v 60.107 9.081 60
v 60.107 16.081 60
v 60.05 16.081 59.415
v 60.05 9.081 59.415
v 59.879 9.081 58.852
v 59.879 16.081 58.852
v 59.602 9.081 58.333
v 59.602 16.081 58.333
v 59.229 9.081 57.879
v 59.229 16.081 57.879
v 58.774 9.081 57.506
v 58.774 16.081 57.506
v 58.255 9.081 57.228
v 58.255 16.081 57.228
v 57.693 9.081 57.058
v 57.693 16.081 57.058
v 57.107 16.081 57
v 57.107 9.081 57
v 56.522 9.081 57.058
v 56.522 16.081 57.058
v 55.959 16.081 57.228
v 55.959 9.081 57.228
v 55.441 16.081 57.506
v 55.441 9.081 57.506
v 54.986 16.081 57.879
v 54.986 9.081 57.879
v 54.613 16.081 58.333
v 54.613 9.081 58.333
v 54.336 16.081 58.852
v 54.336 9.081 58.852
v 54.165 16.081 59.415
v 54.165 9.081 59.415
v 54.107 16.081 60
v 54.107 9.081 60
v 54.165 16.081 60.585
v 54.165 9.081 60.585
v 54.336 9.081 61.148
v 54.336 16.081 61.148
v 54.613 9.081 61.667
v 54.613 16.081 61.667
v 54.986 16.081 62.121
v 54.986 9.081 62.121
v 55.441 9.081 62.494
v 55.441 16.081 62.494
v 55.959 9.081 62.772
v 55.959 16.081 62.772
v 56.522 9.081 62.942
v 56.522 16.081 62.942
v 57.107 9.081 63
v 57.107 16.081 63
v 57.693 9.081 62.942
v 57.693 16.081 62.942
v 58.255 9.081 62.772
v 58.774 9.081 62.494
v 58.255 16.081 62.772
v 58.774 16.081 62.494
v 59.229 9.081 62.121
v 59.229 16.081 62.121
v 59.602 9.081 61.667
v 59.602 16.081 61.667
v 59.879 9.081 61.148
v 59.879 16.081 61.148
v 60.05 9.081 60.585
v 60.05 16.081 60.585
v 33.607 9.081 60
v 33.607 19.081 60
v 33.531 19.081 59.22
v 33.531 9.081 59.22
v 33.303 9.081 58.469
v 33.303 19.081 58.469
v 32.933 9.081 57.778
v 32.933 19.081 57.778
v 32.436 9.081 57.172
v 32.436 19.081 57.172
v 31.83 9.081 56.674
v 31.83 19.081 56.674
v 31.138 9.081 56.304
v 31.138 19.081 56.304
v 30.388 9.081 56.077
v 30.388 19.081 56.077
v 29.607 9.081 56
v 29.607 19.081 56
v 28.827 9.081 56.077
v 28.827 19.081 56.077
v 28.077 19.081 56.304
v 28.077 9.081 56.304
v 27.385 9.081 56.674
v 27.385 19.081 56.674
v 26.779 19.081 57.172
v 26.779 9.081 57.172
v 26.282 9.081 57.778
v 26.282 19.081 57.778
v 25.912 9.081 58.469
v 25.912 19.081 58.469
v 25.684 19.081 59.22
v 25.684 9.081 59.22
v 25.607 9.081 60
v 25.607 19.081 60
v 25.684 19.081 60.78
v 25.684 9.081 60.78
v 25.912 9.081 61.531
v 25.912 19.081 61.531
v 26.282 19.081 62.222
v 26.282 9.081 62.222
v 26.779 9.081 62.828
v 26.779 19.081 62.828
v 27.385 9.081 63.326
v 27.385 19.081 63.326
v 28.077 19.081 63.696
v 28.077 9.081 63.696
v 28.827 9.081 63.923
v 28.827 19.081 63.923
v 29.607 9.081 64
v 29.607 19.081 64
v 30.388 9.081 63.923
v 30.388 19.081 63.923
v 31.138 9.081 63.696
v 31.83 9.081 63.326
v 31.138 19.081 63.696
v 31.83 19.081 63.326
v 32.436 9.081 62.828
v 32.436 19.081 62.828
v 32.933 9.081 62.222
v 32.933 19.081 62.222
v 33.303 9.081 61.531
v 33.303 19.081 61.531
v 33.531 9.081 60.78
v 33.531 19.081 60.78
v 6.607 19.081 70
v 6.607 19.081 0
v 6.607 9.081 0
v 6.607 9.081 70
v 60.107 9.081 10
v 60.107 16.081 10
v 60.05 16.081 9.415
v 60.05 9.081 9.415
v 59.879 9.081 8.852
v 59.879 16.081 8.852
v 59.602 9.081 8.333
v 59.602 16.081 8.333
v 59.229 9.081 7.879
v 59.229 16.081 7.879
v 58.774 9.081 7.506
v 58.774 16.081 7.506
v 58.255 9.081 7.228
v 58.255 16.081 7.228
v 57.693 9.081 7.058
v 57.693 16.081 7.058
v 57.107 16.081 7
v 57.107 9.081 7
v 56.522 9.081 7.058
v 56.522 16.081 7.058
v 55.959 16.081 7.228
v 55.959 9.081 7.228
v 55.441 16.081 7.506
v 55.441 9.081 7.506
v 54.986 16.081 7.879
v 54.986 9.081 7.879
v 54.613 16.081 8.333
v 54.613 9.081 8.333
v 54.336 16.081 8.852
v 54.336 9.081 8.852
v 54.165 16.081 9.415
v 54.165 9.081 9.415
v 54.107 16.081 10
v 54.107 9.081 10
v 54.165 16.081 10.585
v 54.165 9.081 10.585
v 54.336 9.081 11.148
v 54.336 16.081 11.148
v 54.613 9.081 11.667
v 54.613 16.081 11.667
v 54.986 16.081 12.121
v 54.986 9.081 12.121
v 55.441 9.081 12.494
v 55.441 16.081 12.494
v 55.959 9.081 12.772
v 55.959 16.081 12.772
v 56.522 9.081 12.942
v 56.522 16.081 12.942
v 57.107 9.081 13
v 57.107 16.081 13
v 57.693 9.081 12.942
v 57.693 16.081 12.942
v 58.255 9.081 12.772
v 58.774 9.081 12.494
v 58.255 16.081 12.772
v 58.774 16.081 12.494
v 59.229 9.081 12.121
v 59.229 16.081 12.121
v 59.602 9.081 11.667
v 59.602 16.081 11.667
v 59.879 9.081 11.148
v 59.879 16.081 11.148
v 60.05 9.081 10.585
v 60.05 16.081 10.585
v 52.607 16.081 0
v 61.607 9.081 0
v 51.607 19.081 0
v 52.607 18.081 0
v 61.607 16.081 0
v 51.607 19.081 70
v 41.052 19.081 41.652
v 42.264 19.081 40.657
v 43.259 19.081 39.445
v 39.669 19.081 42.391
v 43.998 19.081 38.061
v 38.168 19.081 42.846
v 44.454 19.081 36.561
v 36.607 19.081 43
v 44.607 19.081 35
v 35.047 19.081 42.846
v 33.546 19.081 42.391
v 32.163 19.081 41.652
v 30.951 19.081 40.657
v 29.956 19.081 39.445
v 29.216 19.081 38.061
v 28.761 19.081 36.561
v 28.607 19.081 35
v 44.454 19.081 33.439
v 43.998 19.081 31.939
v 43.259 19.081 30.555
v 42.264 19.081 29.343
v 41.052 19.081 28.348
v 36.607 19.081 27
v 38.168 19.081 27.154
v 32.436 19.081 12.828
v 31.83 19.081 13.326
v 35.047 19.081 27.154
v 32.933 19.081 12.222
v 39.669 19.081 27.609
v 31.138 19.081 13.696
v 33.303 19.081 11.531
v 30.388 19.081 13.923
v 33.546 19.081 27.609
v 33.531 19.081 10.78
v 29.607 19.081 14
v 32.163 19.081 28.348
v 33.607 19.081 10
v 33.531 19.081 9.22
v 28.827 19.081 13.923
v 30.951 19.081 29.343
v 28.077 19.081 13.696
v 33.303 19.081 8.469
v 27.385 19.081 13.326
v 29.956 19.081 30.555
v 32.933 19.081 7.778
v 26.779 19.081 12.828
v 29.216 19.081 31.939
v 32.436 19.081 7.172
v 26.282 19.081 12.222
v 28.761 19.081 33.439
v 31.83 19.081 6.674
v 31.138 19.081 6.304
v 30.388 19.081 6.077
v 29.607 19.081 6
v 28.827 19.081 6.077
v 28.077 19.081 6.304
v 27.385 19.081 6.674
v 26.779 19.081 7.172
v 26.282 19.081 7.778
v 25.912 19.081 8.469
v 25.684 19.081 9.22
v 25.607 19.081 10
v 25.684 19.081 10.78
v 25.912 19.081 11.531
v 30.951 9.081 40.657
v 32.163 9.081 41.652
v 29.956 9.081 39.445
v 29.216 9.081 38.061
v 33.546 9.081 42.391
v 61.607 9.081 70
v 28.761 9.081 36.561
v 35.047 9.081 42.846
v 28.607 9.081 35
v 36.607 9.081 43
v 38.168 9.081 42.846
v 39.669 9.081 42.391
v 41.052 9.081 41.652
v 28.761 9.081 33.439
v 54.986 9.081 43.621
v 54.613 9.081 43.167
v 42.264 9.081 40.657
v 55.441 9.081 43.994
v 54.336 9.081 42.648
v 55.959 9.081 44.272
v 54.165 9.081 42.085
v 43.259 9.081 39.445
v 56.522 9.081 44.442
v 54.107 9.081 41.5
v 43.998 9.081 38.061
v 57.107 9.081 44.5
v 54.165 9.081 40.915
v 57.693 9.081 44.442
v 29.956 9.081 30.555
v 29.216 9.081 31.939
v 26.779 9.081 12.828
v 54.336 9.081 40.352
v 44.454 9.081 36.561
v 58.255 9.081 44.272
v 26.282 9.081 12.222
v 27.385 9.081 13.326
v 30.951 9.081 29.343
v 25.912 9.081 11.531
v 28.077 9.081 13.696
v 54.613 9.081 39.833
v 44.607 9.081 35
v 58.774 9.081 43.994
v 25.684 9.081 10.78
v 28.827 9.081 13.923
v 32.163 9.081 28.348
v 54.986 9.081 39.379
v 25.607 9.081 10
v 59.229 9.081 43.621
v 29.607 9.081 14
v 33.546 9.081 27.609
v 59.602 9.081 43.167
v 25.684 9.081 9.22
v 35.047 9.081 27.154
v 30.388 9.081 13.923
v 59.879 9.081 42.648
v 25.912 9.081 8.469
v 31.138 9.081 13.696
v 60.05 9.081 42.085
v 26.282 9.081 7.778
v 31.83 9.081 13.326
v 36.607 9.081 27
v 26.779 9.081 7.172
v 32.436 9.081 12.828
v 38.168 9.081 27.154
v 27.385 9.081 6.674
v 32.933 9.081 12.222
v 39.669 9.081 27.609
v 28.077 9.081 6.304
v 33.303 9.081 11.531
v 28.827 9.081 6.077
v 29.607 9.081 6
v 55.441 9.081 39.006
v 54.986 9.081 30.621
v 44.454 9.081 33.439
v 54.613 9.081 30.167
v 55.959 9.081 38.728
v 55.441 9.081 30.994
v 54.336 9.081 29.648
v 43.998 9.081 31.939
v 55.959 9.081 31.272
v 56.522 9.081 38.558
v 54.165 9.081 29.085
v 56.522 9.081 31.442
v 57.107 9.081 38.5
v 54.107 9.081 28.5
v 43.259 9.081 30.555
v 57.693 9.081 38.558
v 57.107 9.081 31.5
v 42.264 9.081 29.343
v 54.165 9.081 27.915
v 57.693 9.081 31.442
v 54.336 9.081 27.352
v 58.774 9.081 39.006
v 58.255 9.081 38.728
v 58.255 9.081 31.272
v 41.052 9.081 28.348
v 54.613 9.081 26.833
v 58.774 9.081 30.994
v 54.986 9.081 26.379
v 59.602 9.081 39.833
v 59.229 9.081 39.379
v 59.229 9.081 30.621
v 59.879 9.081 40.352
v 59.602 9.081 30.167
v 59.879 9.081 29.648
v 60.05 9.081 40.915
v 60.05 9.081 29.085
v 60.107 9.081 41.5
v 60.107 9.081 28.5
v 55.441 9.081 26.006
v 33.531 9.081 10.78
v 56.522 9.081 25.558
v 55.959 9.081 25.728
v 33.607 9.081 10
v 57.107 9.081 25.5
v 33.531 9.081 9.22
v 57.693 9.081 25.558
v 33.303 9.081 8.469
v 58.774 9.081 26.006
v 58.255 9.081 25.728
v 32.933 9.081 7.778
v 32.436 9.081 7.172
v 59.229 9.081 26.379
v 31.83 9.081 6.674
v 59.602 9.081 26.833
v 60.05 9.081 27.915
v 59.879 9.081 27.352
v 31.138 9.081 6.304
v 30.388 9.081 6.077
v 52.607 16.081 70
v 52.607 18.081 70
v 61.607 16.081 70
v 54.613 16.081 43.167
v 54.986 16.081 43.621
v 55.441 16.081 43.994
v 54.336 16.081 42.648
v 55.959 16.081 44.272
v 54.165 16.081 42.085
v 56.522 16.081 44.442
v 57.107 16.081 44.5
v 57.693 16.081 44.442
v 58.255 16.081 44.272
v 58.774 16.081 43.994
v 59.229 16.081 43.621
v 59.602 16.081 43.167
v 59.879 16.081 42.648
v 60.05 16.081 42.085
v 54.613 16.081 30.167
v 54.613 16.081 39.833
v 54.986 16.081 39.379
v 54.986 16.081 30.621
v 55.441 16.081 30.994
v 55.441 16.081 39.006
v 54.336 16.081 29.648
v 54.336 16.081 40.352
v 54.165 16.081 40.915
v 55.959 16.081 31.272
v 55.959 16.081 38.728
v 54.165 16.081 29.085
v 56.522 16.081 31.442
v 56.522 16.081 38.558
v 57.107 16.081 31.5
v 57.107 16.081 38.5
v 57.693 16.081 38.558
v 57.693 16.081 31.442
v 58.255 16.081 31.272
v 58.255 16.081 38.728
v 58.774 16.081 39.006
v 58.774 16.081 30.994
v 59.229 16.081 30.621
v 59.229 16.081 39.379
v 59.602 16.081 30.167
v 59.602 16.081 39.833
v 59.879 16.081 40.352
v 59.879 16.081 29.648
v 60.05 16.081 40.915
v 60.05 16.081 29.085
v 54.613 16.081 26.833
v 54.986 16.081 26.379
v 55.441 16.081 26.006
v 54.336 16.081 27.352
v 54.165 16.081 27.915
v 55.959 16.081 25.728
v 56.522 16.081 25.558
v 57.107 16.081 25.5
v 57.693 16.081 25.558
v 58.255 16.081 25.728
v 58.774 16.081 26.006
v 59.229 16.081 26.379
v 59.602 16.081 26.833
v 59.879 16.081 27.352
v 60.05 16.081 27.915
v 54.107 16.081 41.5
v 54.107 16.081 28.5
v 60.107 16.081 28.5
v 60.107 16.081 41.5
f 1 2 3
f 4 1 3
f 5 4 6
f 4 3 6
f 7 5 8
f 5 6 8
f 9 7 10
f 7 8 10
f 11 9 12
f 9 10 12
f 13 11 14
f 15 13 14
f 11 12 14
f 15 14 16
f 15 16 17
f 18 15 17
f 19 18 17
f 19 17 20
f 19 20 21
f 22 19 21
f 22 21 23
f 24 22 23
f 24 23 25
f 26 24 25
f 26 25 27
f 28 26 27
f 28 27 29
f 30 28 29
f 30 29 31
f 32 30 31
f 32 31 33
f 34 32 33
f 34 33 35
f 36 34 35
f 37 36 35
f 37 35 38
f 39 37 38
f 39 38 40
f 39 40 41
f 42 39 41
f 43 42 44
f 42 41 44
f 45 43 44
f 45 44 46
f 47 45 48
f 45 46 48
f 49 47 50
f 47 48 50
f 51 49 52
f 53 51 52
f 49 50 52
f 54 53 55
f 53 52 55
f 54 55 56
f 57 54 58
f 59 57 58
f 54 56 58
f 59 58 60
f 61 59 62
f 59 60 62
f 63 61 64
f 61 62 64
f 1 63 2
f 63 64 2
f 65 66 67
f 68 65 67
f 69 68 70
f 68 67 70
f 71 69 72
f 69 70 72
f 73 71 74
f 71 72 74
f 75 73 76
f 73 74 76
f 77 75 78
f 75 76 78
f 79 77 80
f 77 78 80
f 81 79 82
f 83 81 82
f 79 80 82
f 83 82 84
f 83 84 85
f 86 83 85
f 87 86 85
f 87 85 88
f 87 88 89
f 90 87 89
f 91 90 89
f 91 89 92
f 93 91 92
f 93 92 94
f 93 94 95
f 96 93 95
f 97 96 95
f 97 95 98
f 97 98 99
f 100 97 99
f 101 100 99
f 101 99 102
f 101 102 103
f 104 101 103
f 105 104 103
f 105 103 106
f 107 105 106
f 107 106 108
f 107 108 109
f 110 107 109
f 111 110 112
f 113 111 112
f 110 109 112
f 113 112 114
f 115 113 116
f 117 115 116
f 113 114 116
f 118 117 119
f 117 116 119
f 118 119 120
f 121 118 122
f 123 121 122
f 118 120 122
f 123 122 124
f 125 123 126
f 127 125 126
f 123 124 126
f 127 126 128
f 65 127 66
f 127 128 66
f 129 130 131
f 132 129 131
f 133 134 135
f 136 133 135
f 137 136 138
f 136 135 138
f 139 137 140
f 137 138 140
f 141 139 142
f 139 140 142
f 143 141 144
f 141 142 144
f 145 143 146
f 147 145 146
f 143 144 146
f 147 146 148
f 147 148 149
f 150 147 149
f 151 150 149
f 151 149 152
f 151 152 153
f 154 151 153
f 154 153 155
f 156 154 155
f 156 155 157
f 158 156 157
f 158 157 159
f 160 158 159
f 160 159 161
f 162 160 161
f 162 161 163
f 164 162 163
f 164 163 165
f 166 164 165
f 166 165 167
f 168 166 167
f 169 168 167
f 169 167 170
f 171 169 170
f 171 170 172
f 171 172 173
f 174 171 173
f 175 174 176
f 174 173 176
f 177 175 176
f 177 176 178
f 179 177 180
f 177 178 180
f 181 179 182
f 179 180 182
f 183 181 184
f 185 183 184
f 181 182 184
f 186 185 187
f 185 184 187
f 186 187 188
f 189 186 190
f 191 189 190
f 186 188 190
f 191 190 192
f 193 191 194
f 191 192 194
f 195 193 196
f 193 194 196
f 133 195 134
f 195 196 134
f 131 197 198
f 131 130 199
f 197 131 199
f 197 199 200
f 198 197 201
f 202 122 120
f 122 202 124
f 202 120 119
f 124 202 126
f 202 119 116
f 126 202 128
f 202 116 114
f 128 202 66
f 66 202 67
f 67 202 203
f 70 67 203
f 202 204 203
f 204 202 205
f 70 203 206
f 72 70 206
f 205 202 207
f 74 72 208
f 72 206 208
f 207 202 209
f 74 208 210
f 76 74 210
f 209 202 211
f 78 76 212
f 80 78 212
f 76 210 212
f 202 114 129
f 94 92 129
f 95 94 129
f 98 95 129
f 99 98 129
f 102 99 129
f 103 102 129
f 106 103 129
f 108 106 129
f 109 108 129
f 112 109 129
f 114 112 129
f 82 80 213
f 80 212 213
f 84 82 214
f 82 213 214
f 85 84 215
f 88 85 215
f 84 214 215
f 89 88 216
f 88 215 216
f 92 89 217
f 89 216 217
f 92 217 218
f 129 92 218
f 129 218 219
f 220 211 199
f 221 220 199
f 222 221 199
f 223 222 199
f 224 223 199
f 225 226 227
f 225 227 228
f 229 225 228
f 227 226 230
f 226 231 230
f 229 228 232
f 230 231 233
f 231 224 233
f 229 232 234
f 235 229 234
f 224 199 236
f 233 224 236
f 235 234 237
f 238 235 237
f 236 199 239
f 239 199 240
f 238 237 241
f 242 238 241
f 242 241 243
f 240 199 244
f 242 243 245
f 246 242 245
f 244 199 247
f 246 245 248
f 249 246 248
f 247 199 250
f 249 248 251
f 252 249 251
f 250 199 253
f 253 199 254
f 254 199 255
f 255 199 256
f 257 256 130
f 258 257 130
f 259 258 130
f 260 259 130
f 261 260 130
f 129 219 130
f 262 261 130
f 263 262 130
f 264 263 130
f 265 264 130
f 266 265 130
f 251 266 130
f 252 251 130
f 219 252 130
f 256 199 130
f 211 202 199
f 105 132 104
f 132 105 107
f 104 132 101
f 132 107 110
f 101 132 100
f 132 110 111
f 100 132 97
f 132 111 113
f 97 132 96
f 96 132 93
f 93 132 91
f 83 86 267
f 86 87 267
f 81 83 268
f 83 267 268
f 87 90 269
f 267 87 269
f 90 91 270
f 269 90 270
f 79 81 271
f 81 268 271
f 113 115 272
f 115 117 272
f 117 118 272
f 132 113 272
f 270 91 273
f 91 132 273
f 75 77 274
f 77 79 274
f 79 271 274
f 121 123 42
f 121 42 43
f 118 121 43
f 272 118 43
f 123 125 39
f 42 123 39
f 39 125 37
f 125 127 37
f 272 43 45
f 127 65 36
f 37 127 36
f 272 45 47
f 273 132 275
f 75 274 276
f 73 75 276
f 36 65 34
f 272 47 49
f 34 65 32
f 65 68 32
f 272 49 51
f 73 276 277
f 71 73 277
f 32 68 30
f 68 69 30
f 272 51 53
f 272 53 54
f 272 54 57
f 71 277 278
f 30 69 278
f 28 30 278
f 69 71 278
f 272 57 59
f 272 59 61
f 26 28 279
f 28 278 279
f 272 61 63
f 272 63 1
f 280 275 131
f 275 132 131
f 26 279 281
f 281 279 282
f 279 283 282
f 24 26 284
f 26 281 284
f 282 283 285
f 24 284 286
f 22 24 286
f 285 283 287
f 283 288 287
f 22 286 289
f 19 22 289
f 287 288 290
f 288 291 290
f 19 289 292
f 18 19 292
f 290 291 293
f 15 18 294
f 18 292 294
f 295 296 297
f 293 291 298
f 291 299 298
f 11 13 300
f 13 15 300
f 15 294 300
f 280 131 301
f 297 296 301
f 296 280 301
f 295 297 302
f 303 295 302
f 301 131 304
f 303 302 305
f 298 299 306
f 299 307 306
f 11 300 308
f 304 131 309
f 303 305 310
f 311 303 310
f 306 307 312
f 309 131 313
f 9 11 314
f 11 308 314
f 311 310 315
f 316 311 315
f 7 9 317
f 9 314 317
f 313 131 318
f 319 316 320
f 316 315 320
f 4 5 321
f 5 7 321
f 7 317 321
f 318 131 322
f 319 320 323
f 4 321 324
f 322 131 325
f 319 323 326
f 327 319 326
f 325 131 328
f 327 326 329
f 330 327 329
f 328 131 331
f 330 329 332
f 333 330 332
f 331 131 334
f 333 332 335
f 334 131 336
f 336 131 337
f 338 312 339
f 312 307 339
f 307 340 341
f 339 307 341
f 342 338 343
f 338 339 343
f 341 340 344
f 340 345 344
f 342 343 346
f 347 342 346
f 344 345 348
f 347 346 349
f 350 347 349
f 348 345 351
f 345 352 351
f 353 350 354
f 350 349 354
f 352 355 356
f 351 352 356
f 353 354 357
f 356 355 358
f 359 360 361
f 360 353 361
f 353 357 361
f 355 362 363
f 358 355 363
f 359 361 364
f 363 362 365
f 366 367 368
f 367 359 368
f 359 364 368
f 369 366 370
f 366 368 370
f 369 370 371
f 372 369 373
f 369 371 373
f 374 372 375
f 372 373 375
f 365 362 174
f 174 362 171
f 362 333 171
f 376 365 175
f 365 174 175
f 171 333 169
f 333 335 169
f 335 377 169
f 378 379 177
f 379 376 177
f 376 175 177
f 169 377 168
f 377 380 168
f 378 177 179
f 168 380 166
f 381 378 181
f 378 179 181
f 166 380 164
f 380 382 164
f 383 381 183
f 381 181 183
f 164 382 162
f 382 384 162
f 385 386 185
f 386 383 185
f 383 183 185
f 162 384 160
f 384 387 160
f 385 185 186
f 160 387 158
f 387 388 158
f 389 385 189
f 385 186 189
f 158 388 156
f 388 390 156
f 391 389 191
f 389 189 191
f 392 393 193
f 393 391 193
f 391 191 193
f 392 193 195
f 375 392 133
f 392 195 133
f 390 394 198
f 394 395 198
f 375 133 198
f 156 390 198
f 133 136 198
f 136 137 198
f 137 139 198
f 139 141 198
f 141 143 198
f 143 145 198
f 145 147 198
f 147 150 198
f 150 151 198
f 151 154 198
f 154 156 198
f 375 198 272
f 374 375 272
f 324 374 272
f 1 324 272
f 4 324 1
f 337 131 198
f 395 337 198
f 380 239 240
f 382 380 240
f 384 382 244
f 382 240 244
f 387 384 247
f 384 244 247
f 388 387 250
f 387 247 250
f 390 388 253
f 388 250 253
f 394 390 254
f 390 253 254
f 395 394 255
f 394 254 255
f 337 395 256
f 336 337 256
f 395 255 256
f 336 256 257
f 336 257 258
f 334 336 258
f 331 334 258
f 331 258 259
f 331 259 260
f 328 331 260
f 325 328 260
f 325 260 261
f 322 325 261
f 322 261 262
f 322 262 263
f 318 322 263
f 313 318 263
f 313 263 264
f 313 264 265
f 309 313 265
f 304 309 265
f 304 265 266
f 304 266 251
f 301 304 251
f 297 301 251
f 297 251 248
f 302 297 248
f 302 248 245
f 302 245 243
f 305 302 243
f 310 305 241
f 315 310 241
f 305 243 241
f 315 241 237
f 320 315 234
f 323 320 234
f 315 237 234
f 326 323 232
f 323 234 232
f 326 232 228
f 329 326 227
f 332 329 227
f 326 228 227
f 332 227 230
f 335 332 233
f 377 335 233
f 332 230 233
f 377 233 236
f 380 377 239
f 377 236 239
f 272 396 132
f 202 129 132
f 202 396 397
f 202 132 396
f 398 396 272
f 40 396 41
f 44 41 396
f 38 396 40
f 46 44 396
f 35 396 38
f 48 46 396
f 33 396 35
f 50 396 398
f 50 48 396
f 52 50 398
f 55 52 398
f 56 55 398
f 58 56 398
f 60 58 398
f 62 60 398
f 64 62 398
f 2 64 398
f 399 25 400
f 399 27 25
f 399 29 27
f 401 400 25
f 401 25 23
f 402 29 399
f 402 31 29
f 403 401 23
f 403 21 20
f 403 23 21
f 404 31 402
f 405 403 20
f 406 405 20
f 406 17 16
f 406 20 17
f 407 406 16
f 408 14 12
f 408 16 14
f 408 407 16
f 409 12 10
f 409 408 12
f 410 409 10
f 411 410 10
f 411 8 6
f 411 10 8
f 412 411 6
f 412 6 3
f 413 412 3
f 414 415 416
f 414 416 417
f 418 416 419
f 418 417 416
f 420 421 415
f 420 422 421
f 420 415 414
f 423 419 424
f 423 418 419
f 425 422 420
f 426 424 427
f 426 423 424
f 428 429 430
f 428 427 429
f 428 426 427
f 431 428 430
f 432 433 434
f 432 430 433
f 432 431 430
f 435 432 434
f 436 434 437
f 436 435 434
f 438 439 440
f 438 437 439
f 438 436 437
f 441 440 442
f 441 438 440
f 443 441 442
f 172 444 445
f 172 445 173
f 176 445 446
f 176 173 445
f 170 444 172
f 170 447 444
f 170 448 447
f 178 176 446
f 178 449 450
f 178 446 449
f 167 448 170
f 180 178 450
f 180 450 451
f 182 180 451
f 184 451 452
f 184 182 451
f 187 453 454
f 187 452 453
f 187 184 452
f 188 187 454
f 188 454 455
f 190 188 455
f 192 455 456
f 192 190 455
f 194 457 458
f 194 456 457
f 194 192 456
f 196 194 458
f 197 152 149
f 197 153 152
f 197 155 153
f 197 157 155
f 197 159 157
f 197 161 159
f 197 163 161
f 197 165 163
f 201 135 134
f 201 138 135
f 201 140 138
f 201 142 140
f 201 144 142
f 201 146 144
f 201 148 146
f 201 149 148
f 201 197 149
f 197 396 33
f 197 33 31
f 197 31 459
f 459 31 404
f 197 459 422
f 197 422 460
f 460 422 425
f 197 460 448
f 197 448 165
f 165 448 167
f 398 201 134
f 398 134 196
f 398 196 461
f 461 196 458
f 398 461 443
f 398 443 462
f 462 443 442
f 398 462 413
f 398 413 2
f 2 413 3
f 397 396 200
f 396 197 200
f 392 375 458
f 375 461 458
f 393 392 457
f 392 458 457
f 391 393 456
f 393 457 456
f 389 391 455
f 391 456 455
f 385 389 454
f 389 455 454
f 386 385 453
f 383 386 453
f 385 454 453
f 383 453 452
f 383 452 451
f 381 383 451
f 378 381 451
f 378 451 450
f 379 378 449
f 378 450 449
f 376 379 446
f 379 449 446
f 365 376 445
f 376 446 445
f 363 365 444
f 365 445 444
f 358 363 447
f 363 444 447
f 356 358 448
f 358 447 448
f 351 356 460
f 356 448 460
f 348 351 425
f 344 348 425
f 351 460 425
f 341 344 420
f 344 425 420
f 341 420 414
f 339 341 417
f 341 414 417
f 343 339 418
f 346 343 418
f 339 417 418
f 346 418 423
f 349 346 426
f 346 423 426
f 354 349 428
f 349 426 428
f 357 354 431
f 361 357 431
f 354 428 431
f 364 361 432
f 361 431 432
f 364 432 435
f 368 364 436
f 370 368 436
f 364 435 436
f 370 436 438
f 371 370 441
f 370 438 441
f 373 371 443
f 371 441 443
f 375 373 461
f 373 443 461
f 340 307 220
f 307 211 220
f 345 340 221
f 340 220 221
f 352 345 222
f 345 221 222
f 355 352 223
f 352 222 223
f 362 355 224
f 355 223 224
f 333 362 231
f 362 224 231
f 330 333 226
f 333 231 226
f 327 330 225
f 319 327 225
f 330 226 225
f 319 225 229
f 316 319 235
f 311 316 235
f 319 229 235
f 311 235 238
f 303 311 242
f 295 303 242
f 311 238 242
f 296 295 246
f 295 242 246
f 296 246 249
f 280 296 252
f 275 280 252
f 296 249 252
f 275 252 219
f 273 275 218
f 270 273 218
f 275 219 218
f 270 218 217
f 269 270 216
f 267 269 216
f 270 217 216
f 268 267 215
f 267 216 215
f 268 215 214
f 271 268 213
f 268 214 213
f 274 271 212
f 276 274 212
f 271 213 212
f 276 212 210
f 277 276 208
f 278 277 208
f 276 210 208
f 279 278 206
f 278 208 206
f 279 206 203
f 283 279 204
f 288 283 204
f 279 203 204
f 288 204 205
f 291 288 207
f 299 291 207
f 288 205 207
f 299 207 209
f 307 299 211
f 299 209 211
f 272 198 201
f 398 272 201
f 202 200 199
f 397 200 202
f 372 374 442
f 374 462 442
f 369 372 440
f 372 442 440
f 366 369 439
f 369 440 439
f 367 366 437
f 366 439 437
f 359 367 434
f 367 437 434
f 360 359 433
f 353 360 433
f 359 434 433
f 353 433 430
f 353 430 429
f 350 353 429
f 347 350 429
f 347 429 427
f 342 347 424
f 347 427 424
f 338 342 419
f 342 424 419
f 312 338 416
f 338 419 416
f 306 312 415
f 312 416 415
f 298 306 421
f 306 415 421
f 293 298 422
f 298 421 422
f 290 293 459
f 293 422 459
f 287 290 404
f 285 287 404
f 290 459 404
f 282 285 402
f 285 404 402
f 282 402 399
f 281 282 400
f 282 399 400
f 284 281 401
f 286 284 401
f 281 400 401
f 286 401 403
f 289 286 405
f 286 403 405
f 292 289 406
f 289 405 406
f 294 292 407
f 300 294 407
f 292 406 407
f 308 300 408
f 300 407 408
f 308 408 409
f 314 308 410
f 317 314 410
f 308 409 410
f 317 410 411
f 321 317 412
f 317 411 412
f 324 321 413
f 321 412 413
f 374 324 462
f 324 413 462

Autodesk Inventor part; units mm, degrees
ref_plane "YZ Plane" through (0, 0, 0) normal (1, 0, 0) x (0, 1, 0)
ref_plane "XZ Plane" through (0, 0, 0) normal (0, 1, 0) x (-1, 0, 0)
ref_plane "XY Plane" through (0, 0, 0) normal (0, 0, 1) x (1, 0, 0)
sketch "Sketch1" plane through (0, 0, 0) normal (0, 0, 1) x (1, 0, 0)
  line L0 (6.6074, 9.0814) -> (61.6074, 9.0814)
  line L1 (61.6074, 9.0814) -> (61.6074, 16.0814)
  line L2 (52.6074, 19.0814) -> (6.6074, 19.0814)
  line L3 (6.6074, 19.0814) -> (6.6074, 9.0814)
  line L4 (52.6074, 16.0814) -> (52.6074, 19.0814)
  line L5 (52.6074, 16.0814) -> (61.6074, 16.0814)
  dimension "d0" = 55
  dimension "d1" = 7
  dimension "d6" = 9
  dimension "d7" = 3
extrude "Extrusion1" add sketch "Sketch1" along normal blind 70
sketch "Sketch2" plane through (6.6074, 19.0814, 0) normal (0, 1, 0) x (1, 0, 0)
  circle A0 centre (23, -10) radius 4
  circle A1 centre (23, -60) radius 4
  line L0 (46, -70) -> (0, -70) projected
  line L1 (55, 0) -> (55, -70) projected
  line L2 (46, 0) -> (0, 0) projected
  circle A2 centre (30, -35) radius 8
  line L3 (55, 0) -> (55, -70) projected
  circle A3 centre (50.5, -60) radius 3
  line L4 (46, 0) -> (46, -70) projected
  line L5 (55, -70) -> (46, -70) projected
  circle A4 centre (50.5, -41.5) radius 3
  circle A5 centre (50.5, -10) radius 3
  circle A6 centre (50.5, -28.5) radius 3
  line L6 (55, 0) -> (46, 0) projected
  point P0 (-6.6074, 0)
  dimension "d10" = 8
  dimension "d11" = 8
  dimension "d12" = 10
  dimension "d15" = 10
  dimension "d17" = 16
  dimension "d22" = 6
  dimension "d23" = 4.5
  dimension "d24" = 10
  dimension "d30" = 10
  dimension "d33" = 25
  dimension "d34" = 32
  dimension "d35" = 32
  dimension "d36" = 35
  dimension "d37" = 4.5
  dimension "d38" = 4.5
  dimension "d39" = 4.5
  dimension "d40" = 28.5
  dimension "d41" = 28.5
extrude "Extrusion2" cut sketch "Sketch2" against normal blind 30 contours A0 | A1 | A2 | A3 | A4 | A5 | A6
chamfer "Chaflán1" distance 1 angle 45 1 edges at (52.6074, 19.0814, 35)
equation "\"d24\" = d30"
equation "\"d41\" = d40"
properties part number "Piso, Vínculo Cabezal" material "Aluminum 6061"
